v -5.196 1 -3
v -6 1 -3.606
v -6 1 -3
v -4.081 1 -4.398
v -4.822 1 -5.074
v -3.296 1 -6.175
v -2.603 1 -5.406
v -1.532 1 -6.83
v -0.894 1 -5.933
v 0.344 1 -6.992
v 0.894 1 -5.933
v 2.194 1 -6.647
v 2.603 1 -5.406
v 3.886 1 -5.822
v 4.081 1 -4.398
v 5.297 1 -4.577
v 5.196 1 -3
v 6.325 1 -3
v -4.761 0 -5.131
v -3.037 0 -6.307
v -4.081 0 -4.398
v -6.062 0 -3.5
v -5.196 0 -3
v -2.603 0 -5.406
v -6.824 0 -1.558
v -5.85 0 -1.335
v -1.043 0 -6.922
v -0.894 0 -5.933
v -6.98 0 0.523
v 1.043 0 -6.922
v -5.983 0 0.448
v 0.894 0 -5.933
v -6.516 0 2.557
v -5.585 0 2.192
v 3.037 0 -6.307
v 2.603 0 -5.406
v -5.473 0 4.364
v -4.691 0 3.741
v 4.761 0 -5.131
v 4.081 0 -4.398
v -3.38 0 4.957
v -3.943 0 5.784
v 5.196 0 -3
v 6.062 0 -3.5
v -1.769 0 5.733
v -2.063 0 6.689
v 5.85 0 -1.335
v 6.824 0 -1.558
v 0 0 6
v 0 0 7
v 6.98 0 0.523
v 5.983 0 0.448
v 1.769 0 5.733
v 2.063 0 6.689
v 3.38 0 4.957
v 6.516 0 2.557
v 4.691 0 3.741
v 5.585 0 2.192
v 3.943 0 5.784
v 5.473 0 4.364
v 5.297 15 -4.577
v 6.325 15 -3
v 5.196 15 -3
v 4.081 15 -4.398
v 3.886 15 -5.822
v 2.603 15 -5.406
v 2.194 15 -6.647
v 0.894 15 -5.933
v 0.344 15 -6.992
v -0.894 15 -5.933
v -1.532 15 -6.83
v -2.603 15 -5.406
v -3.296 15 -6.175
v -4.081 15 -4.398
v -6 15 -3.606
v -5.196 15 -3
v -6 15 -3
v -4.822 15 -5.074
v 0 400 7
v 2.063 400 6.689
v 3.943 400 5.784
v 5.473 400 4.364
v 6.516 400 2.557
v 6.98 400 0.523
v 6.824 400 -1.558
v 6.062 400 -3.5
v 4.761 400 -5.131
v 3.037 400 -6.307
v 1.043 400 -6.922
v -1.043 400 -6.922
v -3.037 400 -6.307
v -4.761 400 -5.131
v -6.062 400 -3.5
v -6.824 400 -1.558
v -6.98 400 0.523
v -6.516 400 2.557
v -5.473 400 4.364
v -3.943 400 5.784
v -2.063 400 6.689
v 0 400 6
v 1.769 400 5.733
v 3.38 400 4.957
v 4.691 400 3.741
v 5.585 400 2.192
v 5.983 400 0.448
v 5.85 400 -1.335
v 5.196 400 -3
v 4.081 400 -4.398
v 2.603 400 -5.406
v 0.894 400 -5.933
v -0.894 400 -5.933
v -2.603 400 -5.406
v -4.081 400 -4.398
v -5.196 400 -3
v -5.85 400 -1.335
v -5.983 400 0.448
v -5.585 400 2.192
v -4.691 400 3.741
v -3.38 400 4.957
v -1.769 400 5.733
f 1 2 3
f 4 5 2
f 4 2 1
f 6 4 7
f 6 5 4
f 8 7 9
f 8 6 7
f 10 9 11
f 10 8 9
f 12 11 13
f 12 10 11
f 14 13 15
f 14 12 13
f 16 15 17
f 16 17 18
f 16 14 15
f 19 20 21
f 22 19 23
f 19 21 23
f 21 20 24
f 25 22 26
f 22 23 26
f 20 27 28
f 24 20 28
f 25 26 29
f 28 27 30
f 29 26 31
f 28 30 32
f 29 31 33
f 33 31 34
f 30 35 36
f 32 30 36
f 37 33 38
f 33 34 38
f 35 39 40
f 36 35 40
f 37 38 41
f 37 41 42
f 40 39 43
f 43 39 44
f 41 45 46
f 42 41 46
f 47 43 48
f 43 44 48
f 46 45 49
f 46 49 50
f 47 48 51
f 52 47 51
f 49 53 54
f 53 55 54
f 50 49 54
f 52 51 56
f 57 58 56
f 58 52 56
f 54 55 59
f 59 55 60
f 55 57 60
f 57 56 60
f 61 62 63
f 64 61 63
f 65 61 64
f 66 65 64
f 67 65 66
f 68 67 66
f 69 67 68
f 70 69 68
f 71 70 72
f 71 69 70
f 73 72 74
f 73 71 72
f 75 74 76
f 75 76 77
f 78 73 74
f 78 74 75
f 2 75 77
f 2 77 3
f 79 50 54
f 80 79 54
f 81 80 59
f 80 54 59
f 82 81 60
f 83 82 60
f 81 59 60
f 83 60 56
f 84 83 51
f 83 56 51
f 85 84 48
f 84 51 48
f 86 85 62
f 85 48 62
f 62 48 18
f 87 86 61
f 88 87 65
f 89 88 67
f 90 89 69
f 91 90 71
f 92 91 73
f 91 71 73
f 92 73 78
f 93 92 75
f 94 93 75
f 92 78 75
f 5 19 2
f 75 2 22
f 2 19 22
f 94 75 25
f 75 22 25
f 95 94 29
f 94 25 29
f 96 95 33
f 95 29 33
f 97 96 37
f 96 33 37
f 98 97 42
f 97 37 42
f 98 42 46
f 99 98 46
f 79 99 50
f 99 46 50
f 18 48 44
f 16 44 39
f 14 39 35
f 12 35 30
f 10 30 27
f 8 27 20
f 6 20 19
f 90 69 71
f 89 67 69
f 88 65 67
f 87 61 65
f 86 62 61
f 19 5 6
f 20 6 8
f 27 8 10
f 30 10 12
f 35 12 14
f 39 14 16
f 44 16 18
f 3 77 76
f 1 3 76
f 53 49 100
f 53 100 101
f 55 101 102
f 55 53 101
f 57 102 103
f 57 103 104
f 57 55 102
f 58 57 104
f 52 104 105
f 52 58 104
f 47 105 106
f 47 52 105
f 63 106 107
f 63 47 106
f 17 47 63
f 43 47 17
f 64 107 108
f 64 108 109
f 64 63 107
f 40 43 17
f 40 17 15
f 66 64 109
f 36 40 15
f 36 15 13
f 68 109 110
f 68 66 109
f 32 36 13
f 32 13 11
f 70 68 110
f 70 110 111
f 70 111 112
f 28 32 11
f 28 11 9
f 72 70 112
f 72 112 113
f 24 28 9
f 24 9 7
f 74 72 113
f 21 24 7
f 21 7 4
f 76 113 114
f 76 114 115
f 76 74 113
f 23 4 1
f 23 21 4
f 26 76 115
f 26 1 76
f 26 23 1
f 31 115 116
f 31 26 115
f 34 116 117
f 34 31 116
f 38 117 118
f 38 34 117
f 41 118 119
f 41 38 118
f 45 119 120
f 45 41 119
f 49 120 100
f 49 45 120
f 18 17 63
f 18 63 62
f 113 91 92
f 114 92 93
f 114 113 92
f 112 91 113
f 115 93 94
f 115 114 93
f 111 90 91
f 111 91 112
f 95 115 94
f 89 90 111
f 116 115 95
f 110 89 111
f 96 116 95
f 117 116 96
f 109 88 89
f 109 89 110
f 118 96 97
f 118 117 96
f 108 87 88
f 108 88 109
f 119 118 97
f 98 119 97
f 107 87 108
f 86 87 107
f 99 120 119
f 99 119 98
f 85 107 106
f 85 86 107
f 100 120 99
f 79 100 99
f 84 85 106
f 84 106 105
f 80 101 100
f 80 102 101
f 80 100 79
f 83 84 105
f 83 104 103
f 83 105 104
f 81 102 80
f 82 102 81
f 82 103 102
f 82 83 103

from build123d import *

# Parameters (mm, degrees)
SKETCH1_R           = 7
SKETCH1_R_2         = 6
BOSS_EXTRUDE1_DEPTH = 400
CUT_EXTRUDE1_DEPTH  = 7


with BuildPart() as part:
    # Sketch1 → Boss-Extrude1 (new body)
    with BuildSketch(Plane(origin=(0, 0, 0), x_dir=(1, 0, 0), z_dir=(0, 1, 0))):
        with Locations(Location((0, 0, 0), (0, 0, 270))):
            Circle(SKETCH1_R)
        with Locations(Location((0, 0, 0), (0, 0, 270))):
            Circle(SKETCH1_R_2, mode=Mode.SUBTRACT)
    extrude(amount=BOSS_EXTRUDE1_DEPTH)

    # Sketch3 → Cut-Extrude1 (cut)
    with BuildSketch(Plane.XY.offset(-10)):
        Polygon((-6, 15), (-6, 1), (0, 1), (8, 1), (8, 15), align=None)
    extrude(amount=CUT_EXTRUDE1_DEPTH, mode=Mode.SUBTRACT)


solid = part.part
